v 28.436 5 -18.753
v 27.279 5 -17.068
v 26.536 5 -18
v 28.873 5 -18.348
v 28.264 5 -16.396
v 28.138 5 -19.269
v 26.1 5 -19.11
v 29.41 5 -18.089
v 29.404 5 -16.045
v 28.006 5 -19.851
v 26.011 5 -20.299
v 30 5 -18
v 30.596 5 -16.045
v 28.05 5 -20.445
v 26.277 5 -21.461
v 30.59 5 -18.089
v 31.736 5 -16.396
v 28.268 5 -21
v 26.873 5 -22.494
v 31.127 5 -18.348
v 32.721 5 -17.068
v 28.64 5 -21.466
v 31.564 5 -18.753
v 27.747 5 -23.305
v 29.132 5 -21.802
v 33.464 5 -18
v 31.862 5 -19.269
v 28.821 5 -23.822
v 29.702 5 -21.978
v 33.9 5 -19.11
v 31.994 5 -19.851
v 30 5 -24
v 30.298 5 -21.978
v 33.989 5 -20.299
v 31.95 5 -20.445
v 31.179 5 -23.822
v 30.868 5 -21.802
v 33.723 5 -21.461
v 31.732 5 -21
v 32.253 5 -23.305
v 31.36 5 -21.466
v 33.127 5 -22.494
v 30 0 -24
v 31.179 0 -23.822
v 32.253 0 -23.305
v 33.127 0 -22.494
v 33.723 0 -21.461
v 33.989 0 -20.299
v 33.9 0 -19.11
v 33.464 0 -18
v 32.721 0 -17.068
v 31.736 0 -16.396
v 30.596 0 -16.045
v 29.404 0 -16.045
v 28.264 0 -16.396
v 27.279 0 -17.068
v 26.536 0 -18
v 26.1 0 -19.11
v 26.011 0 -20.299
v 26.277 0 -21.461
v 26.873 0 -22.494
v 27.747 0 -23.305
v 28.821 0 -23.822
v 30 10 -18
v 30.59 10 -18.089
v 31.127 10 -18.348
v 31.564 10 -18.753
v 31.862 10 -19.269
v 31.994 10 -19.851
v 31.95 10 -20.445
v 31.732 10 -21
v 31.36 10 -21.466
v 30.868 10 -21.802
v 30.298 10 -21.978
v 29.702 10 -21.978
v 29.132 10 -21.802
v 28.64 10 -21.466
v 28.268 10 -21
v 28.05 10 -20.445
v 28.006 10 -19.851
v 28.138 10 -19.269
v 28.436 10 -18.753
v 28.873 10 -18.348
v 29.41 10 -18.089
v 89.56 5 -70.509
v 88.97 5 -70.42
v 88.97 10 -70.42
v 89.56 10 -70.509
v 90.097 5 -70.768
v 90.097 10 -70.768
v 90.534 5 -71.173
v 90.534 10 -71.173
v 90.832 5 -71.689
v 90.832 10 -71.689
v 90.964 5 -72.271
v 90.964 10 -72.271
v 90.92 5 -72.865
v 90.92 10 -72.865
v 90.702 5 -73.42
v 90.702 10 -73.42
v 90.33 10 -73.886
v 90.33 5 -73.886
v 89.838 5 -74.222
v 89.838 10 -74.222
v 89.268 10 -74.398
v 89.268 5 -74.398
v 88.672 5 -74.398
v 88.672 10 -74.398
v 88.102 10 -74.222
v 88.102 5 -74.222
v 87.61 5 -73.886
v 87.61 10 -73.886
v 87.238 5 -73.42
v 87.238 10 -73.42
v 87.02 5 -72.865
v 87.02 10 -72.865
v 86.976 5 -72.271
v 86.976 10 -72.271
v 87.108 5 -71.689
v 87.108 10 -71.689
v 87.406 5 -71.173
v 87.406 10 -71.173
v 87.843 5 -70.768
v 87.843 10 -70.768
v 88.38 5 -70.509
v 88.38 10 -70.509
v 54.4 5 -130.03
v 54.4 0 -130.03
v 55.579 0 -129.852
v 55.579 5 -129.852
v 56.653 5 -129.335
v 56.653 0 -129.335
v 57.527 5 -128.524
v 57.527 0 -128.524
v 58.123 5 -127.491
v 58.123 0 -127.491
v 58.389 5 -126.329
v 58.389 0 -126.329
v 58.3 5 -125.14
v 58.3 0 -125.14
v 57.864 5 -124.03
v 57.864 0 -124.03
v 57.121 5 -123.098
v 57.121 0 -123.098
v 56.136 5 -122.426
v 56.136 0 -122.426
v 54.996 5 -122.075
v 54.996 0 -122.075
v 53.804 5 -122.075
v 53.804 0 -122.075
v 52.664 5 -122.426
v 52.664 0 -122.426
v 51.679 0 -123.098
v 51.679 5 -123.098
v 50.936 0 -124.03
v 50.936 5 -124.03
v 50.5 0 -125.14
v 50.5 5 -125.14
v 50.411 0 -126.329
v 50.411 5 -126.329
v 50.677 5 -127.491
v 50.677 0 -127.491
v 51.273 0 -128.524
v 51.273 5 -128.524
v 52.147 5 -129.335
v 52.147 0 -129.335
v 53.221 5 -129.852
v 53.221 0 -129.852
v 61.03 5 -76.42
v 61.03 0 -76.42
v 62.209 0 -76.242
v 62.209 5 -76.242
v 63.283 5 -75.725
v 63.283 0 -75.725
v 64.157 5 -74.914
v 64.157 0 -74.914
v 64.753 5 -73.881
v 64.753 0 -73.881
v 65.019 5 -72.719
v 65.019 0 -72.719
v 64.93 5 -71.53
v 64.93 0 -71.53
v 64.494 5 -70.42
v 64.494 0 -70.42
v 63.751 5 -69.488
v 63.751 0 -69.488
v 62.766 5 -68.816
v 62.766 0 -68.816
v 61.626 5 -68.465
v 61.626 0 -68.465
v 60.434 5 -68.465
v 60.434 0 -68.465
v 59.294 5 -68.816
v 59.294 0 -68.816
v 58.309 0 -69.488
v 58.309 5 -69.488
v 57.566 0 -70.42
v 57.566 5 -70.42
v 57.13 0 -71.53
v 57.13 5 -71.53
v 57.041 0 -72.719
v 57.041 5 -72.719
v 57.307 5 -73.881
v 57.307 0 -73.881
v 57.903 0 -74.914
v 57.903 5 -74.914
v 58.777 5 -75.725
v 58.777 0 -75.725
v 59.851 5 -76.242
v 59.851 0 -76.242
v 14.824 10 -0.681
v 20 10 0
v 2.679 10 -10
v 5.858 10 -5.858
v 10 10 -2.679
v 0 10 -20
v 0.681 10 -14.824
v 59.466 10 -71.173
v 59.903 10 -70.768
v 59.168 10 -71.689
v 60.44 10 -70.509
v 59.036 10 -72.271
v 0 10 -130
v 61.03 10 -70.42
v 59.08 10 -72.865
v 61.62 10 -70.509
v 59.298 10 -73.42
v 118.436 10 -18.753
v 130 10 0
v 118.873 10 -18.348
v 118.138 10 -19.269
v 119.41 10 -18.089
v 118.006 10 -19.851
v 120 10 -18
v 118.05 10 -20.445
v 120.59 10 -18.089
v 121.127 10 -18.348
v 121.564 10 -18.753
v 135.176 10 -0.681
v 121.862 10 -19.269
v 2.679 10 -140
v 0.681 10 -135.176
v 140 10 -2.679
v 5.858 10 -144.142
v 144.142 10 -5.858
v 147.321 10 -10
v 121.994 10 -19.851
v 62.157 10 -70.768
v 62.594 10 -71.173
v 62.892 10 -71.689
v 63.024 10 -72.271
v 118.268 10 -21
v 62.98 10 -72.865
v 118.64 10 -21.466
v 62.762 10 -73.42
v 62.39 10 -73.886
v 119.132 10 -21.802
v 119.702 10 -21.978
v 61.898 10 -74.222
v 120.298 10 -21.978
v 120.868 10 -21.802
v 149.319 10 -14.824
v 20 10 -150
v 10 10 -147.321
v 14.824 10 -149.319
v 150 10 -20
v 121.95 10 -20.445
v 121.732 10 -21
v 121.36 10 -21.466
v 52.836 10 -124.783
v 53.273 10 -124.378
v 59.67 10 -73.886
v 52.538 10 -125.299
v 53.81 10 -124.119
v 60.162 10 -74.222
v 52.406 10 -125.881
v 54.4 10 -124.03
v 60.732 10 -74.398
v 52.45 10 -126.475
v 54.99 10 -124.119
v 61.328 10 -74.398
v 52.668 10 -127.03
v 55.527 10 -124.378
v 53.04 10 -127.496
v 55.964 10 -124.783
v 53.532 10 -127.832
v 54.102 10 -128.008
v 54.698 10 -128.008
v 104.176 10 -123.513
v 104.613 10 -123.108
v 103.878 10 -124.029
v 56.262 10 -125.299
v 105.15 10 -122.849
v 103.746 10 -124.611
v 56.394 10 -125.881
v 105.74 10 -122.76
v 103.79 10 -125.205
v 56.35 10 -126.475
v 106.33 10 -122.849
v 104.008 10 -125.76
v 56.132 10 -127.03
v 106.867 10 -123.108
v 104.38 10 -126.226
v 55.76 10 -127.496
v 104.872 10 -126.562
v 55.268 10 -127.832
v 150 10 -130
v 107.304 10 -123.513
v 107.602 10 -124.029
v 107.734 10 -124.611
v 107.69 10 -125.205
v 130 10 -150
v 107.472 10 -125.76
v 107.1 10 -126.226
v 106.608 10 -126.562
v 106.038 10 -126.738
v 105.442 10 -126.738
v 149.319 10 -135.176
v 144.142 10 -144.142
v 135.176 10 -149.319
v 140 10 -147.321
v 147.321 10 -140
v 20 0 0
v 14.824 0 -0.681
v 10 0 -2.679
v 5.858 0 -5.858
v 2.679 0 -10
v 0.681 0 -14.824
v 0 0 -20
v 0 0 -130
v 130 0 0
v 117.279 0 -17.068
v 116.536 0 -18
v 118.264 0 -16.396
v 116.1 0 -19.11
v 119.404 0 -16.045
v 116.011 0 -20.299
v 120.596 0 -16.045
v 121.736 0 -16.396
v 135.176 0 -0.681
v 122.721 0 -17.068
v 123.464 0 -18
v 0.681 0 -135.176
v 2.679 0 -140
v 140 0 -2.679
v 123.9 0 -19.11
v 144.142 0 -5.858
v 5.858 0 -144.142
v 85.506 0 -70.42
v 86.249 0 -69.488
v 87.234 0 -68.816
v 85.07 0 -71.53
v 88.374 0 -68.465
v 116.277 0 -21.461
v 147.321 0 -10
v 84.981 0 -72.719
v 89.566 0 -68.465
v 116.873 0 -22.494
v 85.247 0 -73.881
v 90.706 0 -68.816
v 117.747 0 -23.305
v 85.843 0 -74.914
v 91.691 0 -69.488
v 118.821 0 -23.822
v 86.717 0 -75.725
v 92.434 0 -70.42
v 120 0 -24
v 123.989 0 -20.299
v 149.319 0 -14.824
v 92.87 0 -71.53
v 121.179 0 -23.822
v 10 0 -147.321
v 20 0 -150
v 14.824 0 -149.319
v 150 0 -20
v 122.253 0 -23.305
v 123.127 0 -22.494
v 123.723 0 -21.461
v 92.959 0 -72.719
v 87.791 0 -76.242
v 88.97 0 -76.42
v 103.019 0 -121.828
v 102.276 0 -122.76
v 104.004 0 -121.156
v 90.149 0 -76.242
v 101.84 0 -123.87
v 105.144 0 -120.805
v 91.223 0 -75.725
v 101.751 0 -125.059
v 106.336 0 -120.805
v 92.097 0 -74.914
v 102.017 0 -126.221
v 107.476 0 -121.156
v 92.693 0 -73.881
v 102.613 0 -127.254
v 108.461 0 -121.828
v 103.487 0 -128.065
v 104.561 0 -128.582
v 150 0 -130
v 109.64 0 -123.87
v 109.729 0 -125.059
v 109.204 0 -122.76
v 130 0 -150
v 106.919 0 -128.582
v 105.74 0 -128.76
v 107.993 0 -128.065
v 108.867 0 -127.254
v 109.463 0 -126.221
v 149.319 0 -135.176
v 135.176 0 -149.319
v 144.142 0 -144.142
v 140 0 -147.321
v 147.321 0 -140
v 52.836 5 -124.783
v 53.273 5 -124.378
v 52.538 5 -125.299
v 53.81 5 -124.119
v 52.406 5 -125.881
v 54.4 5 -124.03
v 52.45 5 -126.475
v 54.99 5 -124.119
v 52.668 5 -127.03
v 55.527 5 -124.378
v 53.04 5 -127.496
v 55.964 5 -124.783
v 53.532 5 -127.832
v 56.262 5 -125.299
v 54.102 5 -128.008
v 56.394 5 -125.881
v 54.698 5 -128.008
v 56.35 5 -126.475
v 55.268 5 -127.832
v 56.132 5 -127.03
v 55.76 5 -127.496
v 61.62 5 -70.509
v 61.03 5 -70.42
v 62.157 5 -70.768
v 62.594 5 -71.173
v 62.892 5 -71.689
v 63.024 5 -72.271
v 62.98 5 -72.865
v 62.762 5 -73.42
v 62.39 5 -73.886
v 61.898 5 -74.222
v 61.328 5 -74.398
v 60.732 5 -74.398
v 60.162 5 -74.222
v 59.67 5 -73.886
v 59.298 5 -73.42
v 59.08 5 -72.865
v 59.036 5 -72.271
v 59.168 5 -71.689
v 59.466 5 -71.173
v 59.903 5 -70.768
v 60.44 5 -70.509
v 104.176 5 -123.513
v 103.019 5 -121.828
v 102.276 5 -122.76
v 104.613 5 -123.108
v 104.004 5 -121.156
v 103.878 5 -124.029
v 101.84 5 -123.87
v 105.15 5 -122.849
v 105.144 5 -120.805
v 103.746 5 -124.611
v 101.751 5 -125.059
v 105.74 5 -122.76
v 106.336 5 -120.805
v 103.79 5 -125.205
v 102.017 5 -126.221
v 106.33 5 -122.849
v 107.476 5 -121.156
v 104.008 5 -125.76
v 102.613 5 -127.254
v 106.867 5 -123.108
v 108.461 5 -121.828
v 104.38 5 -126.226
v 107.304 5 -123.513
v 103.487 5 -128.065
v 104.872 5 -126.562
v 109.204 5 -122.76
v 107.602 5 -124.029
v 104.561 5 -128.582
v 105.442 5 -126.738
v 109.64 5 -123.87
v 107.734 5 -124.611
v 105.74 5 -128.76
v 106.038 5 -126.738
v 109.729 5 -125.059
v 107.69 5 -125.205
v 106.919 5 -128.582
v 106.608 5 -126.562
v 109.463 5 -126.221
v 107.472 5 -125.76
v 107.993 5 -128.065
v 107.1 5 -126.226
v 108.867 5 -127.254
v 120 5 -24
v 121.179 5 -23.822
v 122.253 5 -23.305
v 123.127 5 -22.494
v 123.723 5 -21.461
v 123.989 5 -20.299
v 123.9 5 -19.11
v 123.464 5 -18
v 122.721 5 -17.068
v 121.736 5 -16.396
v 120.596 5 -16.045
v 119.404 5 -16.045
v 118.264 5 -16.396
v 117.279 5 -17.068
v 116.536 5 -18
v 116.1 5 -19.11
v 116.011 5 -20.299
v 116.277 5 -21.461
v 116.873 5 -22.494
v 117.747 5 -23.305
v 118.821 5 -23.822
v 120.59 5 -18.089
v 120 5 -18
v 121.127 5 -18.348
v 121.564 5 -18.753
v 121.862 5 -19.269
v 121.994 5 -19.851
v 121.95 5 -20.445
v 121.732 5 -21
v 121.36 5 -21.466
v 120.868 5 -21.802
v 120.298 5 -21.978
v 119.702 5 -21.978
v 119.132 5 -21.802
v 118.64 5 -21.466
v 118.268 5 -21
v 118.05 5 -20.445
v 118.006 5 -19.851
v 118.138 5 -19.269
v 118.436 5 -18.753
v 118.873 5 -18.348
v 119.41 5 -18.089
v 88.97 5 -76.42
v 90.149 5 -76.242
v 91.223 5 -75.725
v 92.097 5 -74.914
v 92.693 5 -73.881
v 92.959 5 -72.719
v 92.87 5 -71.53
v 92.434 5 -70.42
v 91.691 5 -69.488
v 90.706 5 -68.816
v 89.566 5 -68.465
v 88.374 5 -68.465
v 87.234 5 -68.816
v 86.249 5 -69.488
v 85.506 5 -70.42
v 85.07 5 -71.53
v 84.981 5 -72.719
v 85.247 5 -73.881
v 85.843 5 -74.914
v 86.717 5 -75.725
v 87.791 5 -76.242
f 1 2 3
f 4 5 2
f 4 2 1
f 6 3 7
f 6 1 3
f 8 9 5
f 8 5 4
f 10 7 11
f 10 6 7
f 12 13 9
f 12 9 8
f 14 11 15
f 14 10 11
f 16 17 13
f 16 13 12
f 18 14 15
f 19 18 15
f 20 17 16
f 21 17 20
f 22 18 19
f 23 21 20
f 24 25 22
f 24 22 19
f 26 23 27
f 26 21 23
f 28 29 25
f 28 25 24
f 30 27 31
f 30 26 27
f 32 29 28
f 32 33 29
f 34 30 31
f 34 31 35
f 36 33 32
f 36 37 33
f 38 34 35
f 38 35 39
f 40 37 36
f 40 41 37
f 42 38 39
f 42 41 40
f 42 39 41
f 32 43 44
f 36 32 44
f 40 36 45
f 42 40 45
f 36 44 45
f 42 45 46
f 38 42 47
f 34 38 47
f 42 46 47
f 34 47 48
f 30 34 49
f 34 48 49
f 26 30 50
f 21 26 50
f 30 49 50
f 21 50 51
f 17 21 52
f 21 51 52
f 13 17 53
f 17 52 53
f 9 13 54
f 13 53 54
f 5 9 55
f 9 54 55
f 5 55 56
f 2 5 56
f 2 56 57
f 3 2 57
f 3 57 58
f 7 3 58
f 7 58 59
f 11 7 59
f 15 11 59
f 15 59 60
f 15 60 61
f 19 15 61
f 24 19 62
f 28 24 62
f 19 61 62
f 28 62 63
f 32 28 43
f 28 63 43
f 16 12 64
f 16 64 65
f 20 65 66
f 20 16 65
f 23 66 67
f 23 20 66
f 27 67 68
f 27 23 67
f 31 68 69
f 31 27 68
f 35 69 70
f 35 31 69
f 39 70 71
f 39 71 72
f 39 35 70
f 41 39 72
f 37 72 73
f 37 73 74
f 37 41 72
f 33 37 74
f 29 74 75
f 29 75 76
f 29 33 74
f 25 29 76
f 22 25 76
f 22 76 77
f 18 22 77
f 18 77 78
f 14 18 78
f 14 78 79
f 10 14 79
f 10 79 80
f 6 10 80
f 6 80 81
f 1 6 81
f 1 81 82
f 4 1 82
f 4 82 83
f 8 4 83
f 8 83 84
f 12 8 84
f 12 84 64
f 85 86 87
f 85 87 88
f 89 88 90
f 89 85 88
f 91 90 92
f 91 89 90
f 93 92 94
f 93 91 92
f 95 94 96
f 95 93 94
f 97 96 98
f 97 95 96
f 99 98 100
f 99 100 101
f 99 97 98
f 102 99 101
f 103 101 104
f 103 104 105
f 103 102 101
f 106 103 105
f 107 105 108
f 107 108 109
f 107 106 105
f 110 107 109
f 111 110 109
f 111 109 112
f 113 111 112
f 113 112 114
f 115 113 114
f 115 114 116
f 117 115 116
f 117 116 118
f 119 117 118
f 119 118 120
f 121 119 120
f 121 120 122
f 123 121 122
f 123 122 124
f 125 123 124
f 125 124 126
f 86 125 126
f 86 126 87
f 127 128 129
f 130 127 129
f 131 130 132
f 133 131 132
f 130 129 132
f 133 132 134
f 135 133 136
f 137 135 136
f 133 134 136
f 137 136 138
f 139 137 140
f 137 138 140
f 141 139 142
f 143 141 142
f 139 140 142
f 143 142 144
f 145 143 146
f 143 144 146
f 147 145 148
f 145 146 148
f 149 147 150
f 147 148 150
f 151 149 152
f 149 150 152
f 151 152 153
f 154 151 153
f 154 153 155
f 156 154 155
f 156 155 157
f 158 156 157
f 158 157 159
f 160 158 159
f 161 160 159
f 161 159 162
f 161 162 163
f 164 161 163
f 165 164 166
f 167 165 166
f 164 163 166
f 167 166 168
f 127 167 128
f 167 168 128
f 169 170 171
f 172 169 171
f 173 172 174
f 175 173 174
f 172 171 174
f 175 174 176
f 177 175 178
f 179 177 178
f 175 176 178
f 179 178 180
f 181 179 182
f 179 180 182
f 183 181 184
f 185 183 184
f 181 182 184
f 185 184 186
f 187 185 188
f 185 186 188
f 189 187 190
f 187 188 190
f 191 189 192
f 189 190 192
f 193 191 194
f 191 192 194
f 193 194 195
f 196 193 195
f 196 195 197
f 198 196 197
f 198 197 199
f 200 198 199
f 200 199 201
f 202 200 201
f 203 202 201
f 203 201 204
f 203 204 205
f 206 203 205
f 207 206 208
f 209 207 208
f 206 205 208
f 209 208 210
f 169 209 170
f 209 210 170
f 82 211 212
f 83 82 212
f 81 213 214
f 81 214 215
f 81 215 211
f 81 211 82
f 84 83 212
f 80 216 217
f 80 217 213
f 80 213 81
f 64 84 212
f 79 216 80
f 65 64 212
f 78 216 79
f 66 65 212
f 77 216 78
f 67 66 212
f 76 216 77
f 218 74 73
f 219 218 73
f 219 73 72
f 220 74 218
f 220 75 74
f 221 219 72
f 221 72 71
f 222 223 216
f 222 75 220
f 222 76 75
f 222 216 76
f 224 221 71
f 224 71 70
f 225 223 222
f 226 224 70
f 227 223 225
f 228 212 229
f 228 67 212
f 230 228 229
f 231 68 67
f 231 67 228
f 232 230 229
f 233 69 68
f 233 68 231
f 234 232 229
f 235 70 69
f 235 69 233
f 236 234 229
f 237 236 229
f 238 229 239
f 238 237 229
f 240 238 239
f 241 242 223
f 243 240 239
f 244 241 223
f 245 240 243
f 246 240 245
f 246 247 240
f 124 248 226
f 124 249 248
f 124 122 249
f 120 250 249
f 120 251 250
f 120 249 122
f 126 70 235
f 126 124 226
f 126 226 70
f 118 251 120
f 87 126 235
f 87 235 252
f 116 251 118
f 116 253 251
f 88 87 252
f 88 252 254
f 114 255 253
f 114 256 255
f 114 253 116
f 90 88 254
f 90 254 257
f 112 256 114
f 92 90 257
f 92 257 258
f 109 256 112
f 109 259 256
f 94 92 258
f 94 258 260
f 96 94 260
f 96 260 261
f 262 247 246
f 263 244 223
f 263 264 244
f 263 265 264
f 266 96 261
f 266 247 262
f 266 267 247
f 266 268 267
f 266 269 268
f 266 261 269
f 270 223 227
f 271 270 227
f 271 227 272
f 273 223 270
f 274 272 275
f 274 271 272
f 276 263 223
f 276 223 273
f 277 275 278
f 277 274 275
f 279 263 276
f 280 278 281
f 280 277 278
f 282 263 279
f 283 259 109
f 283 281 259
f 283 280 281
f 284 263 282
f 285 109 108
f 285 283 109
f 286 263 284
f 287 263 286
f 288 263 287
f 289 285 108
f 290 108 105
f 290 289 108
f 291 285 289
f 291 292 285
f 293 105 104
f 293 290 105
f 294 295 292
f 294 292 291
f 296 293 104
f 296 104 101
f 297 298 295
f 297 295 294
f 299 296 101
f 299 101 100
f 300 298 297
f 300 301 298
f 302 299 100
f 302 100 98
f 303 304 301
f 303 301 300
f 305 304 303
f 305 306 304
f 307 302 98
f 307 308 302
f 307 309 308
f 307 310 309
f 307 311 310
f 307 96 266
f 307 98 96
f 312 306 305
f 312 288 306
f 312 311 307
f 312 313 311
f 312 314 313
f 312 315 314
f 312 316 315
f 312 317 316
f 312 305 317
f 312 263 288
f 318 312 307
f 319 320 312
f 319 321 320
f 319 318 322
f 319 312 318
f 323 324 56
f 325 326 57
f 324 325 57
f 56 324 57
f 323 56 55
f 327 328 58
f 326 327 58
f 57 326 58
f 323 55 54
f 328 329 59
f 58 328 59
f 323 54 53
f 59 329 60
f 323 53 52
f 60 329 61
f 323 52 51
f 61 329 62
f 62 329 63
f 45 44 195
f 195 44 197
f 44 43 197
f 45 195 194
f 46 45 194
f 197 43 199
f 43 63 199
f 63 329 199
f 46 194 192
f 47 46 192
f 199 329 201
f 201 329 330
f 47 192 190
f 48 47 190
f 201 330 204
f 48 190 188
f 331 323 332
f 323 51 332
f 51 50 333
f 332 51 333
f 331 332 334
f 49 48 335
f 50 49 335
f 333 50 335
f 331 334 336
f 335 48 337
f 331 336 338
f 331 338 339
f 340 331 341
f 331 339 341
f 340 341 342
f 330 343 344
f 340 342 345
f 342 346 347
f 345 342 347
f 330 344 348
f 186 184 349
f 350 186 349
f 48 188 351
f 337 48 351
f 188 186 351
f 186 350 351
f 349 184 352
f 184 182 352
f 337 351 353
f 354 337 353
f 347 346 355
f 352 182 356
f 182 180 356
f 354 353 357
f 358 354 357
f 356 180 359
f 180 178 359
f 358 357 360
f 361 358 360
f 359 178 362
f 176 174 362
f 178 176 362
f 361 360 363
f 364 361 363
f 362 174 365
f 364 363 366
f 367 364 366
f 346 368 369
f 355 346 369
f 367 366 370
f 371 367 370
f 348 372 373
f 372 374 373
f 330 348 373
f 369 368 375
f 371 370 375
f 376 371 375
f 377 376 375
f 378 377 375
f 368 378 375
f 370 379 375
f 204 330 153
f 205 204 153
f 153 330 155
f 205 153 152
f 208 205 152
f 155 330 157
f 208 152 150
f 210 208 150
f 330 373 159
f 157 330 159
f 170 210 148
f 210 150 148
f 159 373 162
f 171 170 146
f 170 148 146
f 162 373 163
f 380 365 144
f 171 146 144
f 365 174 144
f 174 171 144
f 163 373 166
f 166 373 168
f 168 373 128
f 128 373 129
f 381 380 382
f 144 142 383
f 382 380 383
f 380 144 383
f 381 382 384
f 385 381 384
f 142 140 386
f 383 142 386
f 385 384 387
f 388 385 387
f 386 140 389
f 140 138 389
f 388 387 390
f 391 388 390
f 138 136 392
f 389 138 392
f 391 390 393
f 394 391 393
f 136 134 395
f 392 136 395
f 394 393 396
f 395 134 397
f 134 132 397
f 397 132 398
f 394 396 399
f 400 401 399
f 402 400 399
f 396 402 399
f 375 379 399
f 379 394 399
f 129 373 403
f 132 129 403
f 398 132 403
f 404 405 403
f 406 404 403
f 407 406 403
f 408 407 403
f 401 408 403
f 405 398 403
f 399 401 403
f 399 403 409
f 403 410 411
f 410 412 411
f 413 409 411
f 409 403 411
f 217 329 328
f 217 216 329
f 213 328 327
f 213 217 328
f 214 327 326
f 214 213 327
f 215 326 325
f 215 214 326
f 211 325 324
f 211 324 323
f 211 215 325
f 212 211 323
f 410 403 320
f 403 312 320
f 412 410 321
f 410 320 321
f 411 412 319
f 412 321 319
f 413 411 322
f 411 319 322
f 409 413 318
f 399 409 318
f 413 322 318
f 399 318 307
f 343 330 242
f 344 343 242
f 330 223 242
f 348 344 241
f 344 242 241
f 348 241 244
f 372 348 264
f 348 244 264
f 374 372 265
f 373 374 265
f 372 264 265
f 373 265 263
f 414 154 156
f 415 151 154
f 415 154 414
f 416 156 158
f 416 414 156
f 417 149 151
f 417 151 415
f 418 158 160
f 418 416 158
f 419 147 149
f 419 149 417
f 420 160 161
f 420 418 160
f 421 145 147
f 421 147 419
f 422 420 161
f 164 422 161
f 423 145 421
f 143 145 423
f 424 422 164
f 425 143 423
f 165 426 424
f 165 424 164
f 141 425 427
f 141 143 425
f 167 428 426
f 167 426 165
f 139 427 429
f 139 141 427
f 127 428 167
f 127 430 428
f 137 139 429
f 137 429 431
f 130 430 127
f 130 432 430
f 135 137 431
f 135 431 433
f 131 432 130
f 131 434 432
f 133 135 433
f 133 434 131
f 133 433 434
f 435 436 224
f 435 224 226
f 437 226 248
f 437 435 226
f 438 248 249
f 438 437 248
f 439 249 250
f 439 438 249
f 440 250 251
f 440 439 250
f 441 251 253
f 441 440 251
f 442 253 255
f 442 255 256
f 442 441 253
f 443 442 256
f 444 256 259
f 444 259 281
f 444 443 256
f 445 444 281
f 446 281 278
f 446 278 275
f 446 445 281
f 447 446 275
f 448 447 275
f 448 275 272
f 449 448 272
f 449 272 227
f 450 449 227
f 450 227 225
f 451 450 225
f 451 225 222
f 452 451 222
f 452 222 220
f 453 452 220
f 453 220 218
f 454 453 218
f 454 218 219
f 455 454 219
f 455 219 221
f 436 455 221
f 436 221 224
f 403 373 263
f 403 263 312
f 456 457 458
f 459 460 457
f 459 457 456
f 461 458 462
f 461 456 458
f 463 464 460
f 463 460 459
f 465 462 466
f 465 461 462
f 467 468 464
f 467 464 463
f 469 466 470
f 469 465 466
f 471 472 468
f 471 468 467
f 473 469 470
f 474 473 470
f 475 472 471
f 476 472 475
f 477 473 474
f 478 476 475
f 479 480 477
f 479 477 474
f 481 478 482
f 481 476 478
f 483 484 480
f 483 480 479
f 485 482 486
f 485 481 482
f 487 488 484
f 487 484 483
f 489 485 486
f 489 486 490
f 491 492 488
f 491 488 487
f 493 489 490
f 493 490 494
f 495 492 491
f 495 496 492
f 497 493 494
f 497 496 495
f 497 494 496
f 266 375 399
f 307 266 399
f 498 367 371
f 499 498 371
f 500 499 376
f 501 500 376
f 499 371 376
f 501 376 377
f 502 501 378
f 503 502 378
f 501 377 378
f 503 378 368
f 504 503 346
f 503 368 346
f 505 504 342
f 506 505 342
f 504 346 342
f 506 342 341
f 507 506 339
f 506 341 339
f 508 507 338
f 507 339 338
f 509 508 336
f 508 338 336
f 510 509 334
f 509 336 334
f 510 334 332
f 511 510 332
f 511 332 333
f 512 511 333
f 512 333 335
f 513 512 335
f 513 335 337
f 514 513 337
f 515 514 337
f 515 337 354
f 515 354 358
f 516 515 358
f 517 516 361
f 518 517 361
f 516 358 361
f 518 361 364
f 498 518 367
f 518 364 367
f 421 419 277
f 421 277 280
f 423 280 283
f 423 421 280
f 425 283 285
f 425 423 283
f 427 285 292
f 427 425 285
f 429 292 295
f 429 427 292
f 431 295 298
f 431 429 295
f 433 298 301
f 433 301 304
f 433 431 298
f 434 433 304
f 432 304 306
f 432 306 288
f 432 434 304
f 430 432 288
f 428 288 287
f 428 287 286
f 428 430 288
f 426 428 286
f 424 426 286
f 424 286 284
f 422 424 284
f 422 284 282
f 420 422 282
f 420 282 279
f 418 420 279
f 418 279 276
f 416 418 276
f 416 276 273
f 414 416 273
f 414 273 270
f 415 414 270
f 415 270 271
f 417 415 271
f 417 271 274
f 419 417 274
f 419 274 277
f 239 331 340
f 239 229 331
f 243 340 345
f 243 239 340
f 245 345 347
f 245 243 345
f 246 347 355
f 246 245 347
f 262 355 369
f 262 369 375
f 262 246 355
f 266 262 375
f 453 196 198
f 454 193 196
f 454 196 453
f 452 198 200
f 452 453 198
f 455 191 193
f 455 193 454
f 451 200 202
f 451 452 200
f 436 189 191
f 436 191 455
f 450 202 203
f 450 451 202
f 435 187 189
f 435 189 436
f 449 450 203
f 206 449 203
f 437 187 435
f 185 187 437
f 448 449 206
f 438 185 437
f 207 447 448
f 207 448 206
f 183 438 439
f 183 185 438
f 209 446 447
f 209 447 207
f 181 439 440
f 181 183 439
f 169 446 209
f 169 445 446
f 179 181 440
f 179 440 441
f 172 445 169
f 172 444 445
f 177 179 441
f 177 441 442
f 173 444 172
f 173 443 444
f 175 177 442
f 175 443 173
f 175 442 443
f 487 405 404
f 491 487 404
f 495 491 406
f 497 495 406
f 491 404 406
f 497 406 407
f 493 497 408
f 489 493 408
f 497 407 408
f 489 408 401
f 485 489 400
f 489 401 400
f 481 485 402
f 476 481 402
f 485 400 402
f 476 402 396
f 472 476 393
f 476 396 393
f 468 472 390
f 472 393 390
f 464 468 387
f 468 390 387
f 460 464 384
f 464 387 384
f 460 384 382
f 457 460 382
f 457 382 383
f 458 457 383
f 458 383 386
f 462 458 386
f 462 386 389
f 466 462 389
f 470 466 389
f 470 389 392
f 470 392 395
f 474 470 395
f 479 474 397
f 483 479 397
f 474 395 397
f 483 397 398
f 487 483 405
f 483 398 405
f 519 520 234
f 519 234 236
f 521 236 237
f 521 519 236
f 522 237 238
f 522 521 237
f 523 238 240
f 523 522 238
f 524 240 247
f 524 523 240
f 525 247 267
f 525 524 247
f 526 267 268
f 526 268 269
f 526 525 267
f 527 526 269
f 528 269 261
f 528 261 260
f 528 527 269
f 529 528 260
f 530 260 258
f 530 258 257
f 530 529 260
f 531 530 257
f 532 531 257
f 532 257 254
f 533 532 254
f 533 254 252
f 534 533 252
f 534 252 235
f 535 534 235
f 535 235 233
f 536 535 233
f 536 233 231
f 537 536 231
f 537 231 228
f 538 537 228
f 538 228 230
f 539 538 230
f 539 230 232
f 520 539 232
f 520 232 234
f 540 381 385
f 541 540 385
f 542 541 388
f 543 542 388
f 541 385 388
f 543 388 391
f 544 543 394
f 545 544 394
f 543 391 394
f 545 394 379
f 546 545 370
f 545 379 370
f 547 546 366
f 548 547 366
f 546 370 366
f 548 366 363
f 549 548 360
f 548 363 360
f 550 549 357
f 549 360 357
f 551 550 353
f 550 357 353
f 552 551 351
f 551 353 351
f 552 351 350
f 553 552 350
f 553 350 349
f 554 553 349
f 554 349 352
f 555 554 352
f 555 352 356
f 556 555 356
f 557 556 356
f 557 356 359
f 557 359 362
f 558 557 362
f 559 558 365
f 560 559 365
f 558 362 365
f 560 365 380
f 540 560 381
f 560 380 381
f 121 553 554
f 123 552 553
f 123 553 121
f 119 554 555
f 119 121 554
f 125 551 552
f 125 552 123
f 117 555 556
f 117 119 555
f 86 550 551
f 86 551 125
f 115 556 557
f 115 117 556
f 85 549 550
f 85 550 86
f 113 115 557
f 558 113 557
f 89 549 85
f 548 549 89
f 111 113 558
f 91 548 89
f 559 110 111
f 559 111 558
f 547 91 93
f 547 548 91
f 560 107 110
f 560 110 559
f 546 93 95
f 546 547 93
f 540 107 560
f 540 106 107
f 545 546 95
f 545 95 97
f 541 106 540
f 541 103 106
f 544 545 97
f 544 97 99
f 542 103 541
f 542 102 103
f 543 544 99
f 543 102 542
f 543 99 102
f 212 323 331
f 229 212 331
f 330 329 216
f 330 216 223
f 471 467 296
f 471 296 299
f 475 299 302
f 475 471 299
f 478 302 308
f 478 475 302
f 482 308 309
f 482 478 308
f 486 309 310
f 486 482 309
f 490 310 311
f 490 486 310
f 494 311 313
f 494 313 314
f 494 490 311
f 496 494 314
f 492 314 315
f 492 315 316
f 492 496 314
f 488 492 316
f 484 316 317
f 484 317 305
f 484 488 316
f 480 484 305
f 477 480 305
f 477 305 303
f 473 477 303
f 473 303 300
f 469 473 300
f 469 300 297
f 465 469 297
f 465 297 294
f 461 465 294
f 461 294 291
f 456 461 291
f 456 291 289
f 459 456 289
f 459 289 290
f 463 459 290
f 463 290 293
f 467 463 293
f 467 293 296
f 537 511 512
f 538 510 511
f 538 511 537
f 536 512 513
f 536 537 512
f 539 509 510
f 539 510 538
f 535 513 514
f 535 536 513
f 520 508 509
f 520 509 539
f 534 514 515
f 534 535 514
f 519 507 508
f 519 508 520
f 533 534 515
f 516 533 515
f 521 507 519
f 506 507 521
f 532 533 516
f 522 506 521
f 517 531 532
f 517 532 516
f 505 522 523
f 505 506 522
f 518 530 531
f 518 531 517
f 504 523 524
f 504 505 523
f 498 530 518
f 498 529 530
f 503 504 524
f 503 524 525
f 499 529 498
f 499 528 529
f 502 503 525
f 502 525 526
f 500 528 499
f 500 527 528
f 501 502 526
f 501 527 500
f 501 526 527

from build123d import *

# Parameters (mm, degrees)
SKETCH1_W           = 150
SKETCH1_H           = 150
SKETCH1_R           = 2
BOSS_EXTRUDE1_DEPTH = 10
SKETCH2_R           = 4
CUT_EXTRUDE1_DEPTH  = 5
FILLET1_R           = 20


with BuildPart() as part:
    # Sketch1 → Boss-Extrude1 (new body)
    with BuildSketch(Plane(origin=(0, 0, 0), x_dir=(1, 0, 0), z_dir=(0, 1, 0))):
        with Locations((75, 75)):
            Rectangle(SKETCH1_W, SKETCH1_H)
        with Locations(Location((30, 20, 0), (0, 0, 270))):
            Circle(SKETCH1_R, mode=Mode.SUBTRACT)
        with Locations(Location((120, 20, 0), (0, 0, 270))):
            Circle(SKETCH1_R, mode=Mode.SUBTRACT)
        with Locations(Location((61.03, 72.42, 0), (0, 0, 270))):
            Circle(SKETCH1_R, mode=Mode.SUBTRACT)
        with Locations(Location((88.97, 72.42, 0), (0, 0, 270))):
            Circle(SKETCH1_R, mode=Mode.SUBTRACT)
        with Locations(Location((105.74, 124.76, 0), (0, 0, 270))):
            Circle(SKETCH1_R, mode=Mode.SUBTRACT)
        with Locations(Location((54.4, 126.03, 0), (0, 0, 270))):
            Circle(SKETCH1_R, mode=Mode.SUBTRACT)
    extrude(amount=BOSS_EXTRUDE1_DEPTH)

    # Sketch2 → Cut-Extrude1 (cut)
    with BuildSketch(Plane.XZ):
        with Locations(Location((30, -20, 0), (0, 0, 270))):
            Circle(SKETCH2_R)
        with Locations(Location((120, -20, 0), (0, 0, 270))):
            Circle(SKETCH2_R)
        with Locations(Location((88.97, -72.42, 0), (0, 0, 270))):
            Circle(SKETCH2_R)
        with Locations(Location((61.03, -72.42, 0), (0, 0, 270))):
            Circle(SKETCH2_R)
        with Locations(Location((54.4, -126.03, 0), (0, 0, 270))):
            Circle(SKETCH2_R)
        with Locations(Location((105.74, -124.76, 0), (0, 0, 270))):
            Circle(SKETCH2_R)
    extrude(amount=-CUT_EXTRUDE1_DEPTH, mode=Mode.SUBTRACT)

    # Fillet1
    fillet1_edges = [part.edges().sort_by_distance(p)[0] for p in [
        (0, 5, -150),
        (150, 5, -150),
        (150, 5, 0),
        (0, 5, 0),
    ]]
    fillet(fillet1_edges, radius=FILLET1_R)


solid = part.part
